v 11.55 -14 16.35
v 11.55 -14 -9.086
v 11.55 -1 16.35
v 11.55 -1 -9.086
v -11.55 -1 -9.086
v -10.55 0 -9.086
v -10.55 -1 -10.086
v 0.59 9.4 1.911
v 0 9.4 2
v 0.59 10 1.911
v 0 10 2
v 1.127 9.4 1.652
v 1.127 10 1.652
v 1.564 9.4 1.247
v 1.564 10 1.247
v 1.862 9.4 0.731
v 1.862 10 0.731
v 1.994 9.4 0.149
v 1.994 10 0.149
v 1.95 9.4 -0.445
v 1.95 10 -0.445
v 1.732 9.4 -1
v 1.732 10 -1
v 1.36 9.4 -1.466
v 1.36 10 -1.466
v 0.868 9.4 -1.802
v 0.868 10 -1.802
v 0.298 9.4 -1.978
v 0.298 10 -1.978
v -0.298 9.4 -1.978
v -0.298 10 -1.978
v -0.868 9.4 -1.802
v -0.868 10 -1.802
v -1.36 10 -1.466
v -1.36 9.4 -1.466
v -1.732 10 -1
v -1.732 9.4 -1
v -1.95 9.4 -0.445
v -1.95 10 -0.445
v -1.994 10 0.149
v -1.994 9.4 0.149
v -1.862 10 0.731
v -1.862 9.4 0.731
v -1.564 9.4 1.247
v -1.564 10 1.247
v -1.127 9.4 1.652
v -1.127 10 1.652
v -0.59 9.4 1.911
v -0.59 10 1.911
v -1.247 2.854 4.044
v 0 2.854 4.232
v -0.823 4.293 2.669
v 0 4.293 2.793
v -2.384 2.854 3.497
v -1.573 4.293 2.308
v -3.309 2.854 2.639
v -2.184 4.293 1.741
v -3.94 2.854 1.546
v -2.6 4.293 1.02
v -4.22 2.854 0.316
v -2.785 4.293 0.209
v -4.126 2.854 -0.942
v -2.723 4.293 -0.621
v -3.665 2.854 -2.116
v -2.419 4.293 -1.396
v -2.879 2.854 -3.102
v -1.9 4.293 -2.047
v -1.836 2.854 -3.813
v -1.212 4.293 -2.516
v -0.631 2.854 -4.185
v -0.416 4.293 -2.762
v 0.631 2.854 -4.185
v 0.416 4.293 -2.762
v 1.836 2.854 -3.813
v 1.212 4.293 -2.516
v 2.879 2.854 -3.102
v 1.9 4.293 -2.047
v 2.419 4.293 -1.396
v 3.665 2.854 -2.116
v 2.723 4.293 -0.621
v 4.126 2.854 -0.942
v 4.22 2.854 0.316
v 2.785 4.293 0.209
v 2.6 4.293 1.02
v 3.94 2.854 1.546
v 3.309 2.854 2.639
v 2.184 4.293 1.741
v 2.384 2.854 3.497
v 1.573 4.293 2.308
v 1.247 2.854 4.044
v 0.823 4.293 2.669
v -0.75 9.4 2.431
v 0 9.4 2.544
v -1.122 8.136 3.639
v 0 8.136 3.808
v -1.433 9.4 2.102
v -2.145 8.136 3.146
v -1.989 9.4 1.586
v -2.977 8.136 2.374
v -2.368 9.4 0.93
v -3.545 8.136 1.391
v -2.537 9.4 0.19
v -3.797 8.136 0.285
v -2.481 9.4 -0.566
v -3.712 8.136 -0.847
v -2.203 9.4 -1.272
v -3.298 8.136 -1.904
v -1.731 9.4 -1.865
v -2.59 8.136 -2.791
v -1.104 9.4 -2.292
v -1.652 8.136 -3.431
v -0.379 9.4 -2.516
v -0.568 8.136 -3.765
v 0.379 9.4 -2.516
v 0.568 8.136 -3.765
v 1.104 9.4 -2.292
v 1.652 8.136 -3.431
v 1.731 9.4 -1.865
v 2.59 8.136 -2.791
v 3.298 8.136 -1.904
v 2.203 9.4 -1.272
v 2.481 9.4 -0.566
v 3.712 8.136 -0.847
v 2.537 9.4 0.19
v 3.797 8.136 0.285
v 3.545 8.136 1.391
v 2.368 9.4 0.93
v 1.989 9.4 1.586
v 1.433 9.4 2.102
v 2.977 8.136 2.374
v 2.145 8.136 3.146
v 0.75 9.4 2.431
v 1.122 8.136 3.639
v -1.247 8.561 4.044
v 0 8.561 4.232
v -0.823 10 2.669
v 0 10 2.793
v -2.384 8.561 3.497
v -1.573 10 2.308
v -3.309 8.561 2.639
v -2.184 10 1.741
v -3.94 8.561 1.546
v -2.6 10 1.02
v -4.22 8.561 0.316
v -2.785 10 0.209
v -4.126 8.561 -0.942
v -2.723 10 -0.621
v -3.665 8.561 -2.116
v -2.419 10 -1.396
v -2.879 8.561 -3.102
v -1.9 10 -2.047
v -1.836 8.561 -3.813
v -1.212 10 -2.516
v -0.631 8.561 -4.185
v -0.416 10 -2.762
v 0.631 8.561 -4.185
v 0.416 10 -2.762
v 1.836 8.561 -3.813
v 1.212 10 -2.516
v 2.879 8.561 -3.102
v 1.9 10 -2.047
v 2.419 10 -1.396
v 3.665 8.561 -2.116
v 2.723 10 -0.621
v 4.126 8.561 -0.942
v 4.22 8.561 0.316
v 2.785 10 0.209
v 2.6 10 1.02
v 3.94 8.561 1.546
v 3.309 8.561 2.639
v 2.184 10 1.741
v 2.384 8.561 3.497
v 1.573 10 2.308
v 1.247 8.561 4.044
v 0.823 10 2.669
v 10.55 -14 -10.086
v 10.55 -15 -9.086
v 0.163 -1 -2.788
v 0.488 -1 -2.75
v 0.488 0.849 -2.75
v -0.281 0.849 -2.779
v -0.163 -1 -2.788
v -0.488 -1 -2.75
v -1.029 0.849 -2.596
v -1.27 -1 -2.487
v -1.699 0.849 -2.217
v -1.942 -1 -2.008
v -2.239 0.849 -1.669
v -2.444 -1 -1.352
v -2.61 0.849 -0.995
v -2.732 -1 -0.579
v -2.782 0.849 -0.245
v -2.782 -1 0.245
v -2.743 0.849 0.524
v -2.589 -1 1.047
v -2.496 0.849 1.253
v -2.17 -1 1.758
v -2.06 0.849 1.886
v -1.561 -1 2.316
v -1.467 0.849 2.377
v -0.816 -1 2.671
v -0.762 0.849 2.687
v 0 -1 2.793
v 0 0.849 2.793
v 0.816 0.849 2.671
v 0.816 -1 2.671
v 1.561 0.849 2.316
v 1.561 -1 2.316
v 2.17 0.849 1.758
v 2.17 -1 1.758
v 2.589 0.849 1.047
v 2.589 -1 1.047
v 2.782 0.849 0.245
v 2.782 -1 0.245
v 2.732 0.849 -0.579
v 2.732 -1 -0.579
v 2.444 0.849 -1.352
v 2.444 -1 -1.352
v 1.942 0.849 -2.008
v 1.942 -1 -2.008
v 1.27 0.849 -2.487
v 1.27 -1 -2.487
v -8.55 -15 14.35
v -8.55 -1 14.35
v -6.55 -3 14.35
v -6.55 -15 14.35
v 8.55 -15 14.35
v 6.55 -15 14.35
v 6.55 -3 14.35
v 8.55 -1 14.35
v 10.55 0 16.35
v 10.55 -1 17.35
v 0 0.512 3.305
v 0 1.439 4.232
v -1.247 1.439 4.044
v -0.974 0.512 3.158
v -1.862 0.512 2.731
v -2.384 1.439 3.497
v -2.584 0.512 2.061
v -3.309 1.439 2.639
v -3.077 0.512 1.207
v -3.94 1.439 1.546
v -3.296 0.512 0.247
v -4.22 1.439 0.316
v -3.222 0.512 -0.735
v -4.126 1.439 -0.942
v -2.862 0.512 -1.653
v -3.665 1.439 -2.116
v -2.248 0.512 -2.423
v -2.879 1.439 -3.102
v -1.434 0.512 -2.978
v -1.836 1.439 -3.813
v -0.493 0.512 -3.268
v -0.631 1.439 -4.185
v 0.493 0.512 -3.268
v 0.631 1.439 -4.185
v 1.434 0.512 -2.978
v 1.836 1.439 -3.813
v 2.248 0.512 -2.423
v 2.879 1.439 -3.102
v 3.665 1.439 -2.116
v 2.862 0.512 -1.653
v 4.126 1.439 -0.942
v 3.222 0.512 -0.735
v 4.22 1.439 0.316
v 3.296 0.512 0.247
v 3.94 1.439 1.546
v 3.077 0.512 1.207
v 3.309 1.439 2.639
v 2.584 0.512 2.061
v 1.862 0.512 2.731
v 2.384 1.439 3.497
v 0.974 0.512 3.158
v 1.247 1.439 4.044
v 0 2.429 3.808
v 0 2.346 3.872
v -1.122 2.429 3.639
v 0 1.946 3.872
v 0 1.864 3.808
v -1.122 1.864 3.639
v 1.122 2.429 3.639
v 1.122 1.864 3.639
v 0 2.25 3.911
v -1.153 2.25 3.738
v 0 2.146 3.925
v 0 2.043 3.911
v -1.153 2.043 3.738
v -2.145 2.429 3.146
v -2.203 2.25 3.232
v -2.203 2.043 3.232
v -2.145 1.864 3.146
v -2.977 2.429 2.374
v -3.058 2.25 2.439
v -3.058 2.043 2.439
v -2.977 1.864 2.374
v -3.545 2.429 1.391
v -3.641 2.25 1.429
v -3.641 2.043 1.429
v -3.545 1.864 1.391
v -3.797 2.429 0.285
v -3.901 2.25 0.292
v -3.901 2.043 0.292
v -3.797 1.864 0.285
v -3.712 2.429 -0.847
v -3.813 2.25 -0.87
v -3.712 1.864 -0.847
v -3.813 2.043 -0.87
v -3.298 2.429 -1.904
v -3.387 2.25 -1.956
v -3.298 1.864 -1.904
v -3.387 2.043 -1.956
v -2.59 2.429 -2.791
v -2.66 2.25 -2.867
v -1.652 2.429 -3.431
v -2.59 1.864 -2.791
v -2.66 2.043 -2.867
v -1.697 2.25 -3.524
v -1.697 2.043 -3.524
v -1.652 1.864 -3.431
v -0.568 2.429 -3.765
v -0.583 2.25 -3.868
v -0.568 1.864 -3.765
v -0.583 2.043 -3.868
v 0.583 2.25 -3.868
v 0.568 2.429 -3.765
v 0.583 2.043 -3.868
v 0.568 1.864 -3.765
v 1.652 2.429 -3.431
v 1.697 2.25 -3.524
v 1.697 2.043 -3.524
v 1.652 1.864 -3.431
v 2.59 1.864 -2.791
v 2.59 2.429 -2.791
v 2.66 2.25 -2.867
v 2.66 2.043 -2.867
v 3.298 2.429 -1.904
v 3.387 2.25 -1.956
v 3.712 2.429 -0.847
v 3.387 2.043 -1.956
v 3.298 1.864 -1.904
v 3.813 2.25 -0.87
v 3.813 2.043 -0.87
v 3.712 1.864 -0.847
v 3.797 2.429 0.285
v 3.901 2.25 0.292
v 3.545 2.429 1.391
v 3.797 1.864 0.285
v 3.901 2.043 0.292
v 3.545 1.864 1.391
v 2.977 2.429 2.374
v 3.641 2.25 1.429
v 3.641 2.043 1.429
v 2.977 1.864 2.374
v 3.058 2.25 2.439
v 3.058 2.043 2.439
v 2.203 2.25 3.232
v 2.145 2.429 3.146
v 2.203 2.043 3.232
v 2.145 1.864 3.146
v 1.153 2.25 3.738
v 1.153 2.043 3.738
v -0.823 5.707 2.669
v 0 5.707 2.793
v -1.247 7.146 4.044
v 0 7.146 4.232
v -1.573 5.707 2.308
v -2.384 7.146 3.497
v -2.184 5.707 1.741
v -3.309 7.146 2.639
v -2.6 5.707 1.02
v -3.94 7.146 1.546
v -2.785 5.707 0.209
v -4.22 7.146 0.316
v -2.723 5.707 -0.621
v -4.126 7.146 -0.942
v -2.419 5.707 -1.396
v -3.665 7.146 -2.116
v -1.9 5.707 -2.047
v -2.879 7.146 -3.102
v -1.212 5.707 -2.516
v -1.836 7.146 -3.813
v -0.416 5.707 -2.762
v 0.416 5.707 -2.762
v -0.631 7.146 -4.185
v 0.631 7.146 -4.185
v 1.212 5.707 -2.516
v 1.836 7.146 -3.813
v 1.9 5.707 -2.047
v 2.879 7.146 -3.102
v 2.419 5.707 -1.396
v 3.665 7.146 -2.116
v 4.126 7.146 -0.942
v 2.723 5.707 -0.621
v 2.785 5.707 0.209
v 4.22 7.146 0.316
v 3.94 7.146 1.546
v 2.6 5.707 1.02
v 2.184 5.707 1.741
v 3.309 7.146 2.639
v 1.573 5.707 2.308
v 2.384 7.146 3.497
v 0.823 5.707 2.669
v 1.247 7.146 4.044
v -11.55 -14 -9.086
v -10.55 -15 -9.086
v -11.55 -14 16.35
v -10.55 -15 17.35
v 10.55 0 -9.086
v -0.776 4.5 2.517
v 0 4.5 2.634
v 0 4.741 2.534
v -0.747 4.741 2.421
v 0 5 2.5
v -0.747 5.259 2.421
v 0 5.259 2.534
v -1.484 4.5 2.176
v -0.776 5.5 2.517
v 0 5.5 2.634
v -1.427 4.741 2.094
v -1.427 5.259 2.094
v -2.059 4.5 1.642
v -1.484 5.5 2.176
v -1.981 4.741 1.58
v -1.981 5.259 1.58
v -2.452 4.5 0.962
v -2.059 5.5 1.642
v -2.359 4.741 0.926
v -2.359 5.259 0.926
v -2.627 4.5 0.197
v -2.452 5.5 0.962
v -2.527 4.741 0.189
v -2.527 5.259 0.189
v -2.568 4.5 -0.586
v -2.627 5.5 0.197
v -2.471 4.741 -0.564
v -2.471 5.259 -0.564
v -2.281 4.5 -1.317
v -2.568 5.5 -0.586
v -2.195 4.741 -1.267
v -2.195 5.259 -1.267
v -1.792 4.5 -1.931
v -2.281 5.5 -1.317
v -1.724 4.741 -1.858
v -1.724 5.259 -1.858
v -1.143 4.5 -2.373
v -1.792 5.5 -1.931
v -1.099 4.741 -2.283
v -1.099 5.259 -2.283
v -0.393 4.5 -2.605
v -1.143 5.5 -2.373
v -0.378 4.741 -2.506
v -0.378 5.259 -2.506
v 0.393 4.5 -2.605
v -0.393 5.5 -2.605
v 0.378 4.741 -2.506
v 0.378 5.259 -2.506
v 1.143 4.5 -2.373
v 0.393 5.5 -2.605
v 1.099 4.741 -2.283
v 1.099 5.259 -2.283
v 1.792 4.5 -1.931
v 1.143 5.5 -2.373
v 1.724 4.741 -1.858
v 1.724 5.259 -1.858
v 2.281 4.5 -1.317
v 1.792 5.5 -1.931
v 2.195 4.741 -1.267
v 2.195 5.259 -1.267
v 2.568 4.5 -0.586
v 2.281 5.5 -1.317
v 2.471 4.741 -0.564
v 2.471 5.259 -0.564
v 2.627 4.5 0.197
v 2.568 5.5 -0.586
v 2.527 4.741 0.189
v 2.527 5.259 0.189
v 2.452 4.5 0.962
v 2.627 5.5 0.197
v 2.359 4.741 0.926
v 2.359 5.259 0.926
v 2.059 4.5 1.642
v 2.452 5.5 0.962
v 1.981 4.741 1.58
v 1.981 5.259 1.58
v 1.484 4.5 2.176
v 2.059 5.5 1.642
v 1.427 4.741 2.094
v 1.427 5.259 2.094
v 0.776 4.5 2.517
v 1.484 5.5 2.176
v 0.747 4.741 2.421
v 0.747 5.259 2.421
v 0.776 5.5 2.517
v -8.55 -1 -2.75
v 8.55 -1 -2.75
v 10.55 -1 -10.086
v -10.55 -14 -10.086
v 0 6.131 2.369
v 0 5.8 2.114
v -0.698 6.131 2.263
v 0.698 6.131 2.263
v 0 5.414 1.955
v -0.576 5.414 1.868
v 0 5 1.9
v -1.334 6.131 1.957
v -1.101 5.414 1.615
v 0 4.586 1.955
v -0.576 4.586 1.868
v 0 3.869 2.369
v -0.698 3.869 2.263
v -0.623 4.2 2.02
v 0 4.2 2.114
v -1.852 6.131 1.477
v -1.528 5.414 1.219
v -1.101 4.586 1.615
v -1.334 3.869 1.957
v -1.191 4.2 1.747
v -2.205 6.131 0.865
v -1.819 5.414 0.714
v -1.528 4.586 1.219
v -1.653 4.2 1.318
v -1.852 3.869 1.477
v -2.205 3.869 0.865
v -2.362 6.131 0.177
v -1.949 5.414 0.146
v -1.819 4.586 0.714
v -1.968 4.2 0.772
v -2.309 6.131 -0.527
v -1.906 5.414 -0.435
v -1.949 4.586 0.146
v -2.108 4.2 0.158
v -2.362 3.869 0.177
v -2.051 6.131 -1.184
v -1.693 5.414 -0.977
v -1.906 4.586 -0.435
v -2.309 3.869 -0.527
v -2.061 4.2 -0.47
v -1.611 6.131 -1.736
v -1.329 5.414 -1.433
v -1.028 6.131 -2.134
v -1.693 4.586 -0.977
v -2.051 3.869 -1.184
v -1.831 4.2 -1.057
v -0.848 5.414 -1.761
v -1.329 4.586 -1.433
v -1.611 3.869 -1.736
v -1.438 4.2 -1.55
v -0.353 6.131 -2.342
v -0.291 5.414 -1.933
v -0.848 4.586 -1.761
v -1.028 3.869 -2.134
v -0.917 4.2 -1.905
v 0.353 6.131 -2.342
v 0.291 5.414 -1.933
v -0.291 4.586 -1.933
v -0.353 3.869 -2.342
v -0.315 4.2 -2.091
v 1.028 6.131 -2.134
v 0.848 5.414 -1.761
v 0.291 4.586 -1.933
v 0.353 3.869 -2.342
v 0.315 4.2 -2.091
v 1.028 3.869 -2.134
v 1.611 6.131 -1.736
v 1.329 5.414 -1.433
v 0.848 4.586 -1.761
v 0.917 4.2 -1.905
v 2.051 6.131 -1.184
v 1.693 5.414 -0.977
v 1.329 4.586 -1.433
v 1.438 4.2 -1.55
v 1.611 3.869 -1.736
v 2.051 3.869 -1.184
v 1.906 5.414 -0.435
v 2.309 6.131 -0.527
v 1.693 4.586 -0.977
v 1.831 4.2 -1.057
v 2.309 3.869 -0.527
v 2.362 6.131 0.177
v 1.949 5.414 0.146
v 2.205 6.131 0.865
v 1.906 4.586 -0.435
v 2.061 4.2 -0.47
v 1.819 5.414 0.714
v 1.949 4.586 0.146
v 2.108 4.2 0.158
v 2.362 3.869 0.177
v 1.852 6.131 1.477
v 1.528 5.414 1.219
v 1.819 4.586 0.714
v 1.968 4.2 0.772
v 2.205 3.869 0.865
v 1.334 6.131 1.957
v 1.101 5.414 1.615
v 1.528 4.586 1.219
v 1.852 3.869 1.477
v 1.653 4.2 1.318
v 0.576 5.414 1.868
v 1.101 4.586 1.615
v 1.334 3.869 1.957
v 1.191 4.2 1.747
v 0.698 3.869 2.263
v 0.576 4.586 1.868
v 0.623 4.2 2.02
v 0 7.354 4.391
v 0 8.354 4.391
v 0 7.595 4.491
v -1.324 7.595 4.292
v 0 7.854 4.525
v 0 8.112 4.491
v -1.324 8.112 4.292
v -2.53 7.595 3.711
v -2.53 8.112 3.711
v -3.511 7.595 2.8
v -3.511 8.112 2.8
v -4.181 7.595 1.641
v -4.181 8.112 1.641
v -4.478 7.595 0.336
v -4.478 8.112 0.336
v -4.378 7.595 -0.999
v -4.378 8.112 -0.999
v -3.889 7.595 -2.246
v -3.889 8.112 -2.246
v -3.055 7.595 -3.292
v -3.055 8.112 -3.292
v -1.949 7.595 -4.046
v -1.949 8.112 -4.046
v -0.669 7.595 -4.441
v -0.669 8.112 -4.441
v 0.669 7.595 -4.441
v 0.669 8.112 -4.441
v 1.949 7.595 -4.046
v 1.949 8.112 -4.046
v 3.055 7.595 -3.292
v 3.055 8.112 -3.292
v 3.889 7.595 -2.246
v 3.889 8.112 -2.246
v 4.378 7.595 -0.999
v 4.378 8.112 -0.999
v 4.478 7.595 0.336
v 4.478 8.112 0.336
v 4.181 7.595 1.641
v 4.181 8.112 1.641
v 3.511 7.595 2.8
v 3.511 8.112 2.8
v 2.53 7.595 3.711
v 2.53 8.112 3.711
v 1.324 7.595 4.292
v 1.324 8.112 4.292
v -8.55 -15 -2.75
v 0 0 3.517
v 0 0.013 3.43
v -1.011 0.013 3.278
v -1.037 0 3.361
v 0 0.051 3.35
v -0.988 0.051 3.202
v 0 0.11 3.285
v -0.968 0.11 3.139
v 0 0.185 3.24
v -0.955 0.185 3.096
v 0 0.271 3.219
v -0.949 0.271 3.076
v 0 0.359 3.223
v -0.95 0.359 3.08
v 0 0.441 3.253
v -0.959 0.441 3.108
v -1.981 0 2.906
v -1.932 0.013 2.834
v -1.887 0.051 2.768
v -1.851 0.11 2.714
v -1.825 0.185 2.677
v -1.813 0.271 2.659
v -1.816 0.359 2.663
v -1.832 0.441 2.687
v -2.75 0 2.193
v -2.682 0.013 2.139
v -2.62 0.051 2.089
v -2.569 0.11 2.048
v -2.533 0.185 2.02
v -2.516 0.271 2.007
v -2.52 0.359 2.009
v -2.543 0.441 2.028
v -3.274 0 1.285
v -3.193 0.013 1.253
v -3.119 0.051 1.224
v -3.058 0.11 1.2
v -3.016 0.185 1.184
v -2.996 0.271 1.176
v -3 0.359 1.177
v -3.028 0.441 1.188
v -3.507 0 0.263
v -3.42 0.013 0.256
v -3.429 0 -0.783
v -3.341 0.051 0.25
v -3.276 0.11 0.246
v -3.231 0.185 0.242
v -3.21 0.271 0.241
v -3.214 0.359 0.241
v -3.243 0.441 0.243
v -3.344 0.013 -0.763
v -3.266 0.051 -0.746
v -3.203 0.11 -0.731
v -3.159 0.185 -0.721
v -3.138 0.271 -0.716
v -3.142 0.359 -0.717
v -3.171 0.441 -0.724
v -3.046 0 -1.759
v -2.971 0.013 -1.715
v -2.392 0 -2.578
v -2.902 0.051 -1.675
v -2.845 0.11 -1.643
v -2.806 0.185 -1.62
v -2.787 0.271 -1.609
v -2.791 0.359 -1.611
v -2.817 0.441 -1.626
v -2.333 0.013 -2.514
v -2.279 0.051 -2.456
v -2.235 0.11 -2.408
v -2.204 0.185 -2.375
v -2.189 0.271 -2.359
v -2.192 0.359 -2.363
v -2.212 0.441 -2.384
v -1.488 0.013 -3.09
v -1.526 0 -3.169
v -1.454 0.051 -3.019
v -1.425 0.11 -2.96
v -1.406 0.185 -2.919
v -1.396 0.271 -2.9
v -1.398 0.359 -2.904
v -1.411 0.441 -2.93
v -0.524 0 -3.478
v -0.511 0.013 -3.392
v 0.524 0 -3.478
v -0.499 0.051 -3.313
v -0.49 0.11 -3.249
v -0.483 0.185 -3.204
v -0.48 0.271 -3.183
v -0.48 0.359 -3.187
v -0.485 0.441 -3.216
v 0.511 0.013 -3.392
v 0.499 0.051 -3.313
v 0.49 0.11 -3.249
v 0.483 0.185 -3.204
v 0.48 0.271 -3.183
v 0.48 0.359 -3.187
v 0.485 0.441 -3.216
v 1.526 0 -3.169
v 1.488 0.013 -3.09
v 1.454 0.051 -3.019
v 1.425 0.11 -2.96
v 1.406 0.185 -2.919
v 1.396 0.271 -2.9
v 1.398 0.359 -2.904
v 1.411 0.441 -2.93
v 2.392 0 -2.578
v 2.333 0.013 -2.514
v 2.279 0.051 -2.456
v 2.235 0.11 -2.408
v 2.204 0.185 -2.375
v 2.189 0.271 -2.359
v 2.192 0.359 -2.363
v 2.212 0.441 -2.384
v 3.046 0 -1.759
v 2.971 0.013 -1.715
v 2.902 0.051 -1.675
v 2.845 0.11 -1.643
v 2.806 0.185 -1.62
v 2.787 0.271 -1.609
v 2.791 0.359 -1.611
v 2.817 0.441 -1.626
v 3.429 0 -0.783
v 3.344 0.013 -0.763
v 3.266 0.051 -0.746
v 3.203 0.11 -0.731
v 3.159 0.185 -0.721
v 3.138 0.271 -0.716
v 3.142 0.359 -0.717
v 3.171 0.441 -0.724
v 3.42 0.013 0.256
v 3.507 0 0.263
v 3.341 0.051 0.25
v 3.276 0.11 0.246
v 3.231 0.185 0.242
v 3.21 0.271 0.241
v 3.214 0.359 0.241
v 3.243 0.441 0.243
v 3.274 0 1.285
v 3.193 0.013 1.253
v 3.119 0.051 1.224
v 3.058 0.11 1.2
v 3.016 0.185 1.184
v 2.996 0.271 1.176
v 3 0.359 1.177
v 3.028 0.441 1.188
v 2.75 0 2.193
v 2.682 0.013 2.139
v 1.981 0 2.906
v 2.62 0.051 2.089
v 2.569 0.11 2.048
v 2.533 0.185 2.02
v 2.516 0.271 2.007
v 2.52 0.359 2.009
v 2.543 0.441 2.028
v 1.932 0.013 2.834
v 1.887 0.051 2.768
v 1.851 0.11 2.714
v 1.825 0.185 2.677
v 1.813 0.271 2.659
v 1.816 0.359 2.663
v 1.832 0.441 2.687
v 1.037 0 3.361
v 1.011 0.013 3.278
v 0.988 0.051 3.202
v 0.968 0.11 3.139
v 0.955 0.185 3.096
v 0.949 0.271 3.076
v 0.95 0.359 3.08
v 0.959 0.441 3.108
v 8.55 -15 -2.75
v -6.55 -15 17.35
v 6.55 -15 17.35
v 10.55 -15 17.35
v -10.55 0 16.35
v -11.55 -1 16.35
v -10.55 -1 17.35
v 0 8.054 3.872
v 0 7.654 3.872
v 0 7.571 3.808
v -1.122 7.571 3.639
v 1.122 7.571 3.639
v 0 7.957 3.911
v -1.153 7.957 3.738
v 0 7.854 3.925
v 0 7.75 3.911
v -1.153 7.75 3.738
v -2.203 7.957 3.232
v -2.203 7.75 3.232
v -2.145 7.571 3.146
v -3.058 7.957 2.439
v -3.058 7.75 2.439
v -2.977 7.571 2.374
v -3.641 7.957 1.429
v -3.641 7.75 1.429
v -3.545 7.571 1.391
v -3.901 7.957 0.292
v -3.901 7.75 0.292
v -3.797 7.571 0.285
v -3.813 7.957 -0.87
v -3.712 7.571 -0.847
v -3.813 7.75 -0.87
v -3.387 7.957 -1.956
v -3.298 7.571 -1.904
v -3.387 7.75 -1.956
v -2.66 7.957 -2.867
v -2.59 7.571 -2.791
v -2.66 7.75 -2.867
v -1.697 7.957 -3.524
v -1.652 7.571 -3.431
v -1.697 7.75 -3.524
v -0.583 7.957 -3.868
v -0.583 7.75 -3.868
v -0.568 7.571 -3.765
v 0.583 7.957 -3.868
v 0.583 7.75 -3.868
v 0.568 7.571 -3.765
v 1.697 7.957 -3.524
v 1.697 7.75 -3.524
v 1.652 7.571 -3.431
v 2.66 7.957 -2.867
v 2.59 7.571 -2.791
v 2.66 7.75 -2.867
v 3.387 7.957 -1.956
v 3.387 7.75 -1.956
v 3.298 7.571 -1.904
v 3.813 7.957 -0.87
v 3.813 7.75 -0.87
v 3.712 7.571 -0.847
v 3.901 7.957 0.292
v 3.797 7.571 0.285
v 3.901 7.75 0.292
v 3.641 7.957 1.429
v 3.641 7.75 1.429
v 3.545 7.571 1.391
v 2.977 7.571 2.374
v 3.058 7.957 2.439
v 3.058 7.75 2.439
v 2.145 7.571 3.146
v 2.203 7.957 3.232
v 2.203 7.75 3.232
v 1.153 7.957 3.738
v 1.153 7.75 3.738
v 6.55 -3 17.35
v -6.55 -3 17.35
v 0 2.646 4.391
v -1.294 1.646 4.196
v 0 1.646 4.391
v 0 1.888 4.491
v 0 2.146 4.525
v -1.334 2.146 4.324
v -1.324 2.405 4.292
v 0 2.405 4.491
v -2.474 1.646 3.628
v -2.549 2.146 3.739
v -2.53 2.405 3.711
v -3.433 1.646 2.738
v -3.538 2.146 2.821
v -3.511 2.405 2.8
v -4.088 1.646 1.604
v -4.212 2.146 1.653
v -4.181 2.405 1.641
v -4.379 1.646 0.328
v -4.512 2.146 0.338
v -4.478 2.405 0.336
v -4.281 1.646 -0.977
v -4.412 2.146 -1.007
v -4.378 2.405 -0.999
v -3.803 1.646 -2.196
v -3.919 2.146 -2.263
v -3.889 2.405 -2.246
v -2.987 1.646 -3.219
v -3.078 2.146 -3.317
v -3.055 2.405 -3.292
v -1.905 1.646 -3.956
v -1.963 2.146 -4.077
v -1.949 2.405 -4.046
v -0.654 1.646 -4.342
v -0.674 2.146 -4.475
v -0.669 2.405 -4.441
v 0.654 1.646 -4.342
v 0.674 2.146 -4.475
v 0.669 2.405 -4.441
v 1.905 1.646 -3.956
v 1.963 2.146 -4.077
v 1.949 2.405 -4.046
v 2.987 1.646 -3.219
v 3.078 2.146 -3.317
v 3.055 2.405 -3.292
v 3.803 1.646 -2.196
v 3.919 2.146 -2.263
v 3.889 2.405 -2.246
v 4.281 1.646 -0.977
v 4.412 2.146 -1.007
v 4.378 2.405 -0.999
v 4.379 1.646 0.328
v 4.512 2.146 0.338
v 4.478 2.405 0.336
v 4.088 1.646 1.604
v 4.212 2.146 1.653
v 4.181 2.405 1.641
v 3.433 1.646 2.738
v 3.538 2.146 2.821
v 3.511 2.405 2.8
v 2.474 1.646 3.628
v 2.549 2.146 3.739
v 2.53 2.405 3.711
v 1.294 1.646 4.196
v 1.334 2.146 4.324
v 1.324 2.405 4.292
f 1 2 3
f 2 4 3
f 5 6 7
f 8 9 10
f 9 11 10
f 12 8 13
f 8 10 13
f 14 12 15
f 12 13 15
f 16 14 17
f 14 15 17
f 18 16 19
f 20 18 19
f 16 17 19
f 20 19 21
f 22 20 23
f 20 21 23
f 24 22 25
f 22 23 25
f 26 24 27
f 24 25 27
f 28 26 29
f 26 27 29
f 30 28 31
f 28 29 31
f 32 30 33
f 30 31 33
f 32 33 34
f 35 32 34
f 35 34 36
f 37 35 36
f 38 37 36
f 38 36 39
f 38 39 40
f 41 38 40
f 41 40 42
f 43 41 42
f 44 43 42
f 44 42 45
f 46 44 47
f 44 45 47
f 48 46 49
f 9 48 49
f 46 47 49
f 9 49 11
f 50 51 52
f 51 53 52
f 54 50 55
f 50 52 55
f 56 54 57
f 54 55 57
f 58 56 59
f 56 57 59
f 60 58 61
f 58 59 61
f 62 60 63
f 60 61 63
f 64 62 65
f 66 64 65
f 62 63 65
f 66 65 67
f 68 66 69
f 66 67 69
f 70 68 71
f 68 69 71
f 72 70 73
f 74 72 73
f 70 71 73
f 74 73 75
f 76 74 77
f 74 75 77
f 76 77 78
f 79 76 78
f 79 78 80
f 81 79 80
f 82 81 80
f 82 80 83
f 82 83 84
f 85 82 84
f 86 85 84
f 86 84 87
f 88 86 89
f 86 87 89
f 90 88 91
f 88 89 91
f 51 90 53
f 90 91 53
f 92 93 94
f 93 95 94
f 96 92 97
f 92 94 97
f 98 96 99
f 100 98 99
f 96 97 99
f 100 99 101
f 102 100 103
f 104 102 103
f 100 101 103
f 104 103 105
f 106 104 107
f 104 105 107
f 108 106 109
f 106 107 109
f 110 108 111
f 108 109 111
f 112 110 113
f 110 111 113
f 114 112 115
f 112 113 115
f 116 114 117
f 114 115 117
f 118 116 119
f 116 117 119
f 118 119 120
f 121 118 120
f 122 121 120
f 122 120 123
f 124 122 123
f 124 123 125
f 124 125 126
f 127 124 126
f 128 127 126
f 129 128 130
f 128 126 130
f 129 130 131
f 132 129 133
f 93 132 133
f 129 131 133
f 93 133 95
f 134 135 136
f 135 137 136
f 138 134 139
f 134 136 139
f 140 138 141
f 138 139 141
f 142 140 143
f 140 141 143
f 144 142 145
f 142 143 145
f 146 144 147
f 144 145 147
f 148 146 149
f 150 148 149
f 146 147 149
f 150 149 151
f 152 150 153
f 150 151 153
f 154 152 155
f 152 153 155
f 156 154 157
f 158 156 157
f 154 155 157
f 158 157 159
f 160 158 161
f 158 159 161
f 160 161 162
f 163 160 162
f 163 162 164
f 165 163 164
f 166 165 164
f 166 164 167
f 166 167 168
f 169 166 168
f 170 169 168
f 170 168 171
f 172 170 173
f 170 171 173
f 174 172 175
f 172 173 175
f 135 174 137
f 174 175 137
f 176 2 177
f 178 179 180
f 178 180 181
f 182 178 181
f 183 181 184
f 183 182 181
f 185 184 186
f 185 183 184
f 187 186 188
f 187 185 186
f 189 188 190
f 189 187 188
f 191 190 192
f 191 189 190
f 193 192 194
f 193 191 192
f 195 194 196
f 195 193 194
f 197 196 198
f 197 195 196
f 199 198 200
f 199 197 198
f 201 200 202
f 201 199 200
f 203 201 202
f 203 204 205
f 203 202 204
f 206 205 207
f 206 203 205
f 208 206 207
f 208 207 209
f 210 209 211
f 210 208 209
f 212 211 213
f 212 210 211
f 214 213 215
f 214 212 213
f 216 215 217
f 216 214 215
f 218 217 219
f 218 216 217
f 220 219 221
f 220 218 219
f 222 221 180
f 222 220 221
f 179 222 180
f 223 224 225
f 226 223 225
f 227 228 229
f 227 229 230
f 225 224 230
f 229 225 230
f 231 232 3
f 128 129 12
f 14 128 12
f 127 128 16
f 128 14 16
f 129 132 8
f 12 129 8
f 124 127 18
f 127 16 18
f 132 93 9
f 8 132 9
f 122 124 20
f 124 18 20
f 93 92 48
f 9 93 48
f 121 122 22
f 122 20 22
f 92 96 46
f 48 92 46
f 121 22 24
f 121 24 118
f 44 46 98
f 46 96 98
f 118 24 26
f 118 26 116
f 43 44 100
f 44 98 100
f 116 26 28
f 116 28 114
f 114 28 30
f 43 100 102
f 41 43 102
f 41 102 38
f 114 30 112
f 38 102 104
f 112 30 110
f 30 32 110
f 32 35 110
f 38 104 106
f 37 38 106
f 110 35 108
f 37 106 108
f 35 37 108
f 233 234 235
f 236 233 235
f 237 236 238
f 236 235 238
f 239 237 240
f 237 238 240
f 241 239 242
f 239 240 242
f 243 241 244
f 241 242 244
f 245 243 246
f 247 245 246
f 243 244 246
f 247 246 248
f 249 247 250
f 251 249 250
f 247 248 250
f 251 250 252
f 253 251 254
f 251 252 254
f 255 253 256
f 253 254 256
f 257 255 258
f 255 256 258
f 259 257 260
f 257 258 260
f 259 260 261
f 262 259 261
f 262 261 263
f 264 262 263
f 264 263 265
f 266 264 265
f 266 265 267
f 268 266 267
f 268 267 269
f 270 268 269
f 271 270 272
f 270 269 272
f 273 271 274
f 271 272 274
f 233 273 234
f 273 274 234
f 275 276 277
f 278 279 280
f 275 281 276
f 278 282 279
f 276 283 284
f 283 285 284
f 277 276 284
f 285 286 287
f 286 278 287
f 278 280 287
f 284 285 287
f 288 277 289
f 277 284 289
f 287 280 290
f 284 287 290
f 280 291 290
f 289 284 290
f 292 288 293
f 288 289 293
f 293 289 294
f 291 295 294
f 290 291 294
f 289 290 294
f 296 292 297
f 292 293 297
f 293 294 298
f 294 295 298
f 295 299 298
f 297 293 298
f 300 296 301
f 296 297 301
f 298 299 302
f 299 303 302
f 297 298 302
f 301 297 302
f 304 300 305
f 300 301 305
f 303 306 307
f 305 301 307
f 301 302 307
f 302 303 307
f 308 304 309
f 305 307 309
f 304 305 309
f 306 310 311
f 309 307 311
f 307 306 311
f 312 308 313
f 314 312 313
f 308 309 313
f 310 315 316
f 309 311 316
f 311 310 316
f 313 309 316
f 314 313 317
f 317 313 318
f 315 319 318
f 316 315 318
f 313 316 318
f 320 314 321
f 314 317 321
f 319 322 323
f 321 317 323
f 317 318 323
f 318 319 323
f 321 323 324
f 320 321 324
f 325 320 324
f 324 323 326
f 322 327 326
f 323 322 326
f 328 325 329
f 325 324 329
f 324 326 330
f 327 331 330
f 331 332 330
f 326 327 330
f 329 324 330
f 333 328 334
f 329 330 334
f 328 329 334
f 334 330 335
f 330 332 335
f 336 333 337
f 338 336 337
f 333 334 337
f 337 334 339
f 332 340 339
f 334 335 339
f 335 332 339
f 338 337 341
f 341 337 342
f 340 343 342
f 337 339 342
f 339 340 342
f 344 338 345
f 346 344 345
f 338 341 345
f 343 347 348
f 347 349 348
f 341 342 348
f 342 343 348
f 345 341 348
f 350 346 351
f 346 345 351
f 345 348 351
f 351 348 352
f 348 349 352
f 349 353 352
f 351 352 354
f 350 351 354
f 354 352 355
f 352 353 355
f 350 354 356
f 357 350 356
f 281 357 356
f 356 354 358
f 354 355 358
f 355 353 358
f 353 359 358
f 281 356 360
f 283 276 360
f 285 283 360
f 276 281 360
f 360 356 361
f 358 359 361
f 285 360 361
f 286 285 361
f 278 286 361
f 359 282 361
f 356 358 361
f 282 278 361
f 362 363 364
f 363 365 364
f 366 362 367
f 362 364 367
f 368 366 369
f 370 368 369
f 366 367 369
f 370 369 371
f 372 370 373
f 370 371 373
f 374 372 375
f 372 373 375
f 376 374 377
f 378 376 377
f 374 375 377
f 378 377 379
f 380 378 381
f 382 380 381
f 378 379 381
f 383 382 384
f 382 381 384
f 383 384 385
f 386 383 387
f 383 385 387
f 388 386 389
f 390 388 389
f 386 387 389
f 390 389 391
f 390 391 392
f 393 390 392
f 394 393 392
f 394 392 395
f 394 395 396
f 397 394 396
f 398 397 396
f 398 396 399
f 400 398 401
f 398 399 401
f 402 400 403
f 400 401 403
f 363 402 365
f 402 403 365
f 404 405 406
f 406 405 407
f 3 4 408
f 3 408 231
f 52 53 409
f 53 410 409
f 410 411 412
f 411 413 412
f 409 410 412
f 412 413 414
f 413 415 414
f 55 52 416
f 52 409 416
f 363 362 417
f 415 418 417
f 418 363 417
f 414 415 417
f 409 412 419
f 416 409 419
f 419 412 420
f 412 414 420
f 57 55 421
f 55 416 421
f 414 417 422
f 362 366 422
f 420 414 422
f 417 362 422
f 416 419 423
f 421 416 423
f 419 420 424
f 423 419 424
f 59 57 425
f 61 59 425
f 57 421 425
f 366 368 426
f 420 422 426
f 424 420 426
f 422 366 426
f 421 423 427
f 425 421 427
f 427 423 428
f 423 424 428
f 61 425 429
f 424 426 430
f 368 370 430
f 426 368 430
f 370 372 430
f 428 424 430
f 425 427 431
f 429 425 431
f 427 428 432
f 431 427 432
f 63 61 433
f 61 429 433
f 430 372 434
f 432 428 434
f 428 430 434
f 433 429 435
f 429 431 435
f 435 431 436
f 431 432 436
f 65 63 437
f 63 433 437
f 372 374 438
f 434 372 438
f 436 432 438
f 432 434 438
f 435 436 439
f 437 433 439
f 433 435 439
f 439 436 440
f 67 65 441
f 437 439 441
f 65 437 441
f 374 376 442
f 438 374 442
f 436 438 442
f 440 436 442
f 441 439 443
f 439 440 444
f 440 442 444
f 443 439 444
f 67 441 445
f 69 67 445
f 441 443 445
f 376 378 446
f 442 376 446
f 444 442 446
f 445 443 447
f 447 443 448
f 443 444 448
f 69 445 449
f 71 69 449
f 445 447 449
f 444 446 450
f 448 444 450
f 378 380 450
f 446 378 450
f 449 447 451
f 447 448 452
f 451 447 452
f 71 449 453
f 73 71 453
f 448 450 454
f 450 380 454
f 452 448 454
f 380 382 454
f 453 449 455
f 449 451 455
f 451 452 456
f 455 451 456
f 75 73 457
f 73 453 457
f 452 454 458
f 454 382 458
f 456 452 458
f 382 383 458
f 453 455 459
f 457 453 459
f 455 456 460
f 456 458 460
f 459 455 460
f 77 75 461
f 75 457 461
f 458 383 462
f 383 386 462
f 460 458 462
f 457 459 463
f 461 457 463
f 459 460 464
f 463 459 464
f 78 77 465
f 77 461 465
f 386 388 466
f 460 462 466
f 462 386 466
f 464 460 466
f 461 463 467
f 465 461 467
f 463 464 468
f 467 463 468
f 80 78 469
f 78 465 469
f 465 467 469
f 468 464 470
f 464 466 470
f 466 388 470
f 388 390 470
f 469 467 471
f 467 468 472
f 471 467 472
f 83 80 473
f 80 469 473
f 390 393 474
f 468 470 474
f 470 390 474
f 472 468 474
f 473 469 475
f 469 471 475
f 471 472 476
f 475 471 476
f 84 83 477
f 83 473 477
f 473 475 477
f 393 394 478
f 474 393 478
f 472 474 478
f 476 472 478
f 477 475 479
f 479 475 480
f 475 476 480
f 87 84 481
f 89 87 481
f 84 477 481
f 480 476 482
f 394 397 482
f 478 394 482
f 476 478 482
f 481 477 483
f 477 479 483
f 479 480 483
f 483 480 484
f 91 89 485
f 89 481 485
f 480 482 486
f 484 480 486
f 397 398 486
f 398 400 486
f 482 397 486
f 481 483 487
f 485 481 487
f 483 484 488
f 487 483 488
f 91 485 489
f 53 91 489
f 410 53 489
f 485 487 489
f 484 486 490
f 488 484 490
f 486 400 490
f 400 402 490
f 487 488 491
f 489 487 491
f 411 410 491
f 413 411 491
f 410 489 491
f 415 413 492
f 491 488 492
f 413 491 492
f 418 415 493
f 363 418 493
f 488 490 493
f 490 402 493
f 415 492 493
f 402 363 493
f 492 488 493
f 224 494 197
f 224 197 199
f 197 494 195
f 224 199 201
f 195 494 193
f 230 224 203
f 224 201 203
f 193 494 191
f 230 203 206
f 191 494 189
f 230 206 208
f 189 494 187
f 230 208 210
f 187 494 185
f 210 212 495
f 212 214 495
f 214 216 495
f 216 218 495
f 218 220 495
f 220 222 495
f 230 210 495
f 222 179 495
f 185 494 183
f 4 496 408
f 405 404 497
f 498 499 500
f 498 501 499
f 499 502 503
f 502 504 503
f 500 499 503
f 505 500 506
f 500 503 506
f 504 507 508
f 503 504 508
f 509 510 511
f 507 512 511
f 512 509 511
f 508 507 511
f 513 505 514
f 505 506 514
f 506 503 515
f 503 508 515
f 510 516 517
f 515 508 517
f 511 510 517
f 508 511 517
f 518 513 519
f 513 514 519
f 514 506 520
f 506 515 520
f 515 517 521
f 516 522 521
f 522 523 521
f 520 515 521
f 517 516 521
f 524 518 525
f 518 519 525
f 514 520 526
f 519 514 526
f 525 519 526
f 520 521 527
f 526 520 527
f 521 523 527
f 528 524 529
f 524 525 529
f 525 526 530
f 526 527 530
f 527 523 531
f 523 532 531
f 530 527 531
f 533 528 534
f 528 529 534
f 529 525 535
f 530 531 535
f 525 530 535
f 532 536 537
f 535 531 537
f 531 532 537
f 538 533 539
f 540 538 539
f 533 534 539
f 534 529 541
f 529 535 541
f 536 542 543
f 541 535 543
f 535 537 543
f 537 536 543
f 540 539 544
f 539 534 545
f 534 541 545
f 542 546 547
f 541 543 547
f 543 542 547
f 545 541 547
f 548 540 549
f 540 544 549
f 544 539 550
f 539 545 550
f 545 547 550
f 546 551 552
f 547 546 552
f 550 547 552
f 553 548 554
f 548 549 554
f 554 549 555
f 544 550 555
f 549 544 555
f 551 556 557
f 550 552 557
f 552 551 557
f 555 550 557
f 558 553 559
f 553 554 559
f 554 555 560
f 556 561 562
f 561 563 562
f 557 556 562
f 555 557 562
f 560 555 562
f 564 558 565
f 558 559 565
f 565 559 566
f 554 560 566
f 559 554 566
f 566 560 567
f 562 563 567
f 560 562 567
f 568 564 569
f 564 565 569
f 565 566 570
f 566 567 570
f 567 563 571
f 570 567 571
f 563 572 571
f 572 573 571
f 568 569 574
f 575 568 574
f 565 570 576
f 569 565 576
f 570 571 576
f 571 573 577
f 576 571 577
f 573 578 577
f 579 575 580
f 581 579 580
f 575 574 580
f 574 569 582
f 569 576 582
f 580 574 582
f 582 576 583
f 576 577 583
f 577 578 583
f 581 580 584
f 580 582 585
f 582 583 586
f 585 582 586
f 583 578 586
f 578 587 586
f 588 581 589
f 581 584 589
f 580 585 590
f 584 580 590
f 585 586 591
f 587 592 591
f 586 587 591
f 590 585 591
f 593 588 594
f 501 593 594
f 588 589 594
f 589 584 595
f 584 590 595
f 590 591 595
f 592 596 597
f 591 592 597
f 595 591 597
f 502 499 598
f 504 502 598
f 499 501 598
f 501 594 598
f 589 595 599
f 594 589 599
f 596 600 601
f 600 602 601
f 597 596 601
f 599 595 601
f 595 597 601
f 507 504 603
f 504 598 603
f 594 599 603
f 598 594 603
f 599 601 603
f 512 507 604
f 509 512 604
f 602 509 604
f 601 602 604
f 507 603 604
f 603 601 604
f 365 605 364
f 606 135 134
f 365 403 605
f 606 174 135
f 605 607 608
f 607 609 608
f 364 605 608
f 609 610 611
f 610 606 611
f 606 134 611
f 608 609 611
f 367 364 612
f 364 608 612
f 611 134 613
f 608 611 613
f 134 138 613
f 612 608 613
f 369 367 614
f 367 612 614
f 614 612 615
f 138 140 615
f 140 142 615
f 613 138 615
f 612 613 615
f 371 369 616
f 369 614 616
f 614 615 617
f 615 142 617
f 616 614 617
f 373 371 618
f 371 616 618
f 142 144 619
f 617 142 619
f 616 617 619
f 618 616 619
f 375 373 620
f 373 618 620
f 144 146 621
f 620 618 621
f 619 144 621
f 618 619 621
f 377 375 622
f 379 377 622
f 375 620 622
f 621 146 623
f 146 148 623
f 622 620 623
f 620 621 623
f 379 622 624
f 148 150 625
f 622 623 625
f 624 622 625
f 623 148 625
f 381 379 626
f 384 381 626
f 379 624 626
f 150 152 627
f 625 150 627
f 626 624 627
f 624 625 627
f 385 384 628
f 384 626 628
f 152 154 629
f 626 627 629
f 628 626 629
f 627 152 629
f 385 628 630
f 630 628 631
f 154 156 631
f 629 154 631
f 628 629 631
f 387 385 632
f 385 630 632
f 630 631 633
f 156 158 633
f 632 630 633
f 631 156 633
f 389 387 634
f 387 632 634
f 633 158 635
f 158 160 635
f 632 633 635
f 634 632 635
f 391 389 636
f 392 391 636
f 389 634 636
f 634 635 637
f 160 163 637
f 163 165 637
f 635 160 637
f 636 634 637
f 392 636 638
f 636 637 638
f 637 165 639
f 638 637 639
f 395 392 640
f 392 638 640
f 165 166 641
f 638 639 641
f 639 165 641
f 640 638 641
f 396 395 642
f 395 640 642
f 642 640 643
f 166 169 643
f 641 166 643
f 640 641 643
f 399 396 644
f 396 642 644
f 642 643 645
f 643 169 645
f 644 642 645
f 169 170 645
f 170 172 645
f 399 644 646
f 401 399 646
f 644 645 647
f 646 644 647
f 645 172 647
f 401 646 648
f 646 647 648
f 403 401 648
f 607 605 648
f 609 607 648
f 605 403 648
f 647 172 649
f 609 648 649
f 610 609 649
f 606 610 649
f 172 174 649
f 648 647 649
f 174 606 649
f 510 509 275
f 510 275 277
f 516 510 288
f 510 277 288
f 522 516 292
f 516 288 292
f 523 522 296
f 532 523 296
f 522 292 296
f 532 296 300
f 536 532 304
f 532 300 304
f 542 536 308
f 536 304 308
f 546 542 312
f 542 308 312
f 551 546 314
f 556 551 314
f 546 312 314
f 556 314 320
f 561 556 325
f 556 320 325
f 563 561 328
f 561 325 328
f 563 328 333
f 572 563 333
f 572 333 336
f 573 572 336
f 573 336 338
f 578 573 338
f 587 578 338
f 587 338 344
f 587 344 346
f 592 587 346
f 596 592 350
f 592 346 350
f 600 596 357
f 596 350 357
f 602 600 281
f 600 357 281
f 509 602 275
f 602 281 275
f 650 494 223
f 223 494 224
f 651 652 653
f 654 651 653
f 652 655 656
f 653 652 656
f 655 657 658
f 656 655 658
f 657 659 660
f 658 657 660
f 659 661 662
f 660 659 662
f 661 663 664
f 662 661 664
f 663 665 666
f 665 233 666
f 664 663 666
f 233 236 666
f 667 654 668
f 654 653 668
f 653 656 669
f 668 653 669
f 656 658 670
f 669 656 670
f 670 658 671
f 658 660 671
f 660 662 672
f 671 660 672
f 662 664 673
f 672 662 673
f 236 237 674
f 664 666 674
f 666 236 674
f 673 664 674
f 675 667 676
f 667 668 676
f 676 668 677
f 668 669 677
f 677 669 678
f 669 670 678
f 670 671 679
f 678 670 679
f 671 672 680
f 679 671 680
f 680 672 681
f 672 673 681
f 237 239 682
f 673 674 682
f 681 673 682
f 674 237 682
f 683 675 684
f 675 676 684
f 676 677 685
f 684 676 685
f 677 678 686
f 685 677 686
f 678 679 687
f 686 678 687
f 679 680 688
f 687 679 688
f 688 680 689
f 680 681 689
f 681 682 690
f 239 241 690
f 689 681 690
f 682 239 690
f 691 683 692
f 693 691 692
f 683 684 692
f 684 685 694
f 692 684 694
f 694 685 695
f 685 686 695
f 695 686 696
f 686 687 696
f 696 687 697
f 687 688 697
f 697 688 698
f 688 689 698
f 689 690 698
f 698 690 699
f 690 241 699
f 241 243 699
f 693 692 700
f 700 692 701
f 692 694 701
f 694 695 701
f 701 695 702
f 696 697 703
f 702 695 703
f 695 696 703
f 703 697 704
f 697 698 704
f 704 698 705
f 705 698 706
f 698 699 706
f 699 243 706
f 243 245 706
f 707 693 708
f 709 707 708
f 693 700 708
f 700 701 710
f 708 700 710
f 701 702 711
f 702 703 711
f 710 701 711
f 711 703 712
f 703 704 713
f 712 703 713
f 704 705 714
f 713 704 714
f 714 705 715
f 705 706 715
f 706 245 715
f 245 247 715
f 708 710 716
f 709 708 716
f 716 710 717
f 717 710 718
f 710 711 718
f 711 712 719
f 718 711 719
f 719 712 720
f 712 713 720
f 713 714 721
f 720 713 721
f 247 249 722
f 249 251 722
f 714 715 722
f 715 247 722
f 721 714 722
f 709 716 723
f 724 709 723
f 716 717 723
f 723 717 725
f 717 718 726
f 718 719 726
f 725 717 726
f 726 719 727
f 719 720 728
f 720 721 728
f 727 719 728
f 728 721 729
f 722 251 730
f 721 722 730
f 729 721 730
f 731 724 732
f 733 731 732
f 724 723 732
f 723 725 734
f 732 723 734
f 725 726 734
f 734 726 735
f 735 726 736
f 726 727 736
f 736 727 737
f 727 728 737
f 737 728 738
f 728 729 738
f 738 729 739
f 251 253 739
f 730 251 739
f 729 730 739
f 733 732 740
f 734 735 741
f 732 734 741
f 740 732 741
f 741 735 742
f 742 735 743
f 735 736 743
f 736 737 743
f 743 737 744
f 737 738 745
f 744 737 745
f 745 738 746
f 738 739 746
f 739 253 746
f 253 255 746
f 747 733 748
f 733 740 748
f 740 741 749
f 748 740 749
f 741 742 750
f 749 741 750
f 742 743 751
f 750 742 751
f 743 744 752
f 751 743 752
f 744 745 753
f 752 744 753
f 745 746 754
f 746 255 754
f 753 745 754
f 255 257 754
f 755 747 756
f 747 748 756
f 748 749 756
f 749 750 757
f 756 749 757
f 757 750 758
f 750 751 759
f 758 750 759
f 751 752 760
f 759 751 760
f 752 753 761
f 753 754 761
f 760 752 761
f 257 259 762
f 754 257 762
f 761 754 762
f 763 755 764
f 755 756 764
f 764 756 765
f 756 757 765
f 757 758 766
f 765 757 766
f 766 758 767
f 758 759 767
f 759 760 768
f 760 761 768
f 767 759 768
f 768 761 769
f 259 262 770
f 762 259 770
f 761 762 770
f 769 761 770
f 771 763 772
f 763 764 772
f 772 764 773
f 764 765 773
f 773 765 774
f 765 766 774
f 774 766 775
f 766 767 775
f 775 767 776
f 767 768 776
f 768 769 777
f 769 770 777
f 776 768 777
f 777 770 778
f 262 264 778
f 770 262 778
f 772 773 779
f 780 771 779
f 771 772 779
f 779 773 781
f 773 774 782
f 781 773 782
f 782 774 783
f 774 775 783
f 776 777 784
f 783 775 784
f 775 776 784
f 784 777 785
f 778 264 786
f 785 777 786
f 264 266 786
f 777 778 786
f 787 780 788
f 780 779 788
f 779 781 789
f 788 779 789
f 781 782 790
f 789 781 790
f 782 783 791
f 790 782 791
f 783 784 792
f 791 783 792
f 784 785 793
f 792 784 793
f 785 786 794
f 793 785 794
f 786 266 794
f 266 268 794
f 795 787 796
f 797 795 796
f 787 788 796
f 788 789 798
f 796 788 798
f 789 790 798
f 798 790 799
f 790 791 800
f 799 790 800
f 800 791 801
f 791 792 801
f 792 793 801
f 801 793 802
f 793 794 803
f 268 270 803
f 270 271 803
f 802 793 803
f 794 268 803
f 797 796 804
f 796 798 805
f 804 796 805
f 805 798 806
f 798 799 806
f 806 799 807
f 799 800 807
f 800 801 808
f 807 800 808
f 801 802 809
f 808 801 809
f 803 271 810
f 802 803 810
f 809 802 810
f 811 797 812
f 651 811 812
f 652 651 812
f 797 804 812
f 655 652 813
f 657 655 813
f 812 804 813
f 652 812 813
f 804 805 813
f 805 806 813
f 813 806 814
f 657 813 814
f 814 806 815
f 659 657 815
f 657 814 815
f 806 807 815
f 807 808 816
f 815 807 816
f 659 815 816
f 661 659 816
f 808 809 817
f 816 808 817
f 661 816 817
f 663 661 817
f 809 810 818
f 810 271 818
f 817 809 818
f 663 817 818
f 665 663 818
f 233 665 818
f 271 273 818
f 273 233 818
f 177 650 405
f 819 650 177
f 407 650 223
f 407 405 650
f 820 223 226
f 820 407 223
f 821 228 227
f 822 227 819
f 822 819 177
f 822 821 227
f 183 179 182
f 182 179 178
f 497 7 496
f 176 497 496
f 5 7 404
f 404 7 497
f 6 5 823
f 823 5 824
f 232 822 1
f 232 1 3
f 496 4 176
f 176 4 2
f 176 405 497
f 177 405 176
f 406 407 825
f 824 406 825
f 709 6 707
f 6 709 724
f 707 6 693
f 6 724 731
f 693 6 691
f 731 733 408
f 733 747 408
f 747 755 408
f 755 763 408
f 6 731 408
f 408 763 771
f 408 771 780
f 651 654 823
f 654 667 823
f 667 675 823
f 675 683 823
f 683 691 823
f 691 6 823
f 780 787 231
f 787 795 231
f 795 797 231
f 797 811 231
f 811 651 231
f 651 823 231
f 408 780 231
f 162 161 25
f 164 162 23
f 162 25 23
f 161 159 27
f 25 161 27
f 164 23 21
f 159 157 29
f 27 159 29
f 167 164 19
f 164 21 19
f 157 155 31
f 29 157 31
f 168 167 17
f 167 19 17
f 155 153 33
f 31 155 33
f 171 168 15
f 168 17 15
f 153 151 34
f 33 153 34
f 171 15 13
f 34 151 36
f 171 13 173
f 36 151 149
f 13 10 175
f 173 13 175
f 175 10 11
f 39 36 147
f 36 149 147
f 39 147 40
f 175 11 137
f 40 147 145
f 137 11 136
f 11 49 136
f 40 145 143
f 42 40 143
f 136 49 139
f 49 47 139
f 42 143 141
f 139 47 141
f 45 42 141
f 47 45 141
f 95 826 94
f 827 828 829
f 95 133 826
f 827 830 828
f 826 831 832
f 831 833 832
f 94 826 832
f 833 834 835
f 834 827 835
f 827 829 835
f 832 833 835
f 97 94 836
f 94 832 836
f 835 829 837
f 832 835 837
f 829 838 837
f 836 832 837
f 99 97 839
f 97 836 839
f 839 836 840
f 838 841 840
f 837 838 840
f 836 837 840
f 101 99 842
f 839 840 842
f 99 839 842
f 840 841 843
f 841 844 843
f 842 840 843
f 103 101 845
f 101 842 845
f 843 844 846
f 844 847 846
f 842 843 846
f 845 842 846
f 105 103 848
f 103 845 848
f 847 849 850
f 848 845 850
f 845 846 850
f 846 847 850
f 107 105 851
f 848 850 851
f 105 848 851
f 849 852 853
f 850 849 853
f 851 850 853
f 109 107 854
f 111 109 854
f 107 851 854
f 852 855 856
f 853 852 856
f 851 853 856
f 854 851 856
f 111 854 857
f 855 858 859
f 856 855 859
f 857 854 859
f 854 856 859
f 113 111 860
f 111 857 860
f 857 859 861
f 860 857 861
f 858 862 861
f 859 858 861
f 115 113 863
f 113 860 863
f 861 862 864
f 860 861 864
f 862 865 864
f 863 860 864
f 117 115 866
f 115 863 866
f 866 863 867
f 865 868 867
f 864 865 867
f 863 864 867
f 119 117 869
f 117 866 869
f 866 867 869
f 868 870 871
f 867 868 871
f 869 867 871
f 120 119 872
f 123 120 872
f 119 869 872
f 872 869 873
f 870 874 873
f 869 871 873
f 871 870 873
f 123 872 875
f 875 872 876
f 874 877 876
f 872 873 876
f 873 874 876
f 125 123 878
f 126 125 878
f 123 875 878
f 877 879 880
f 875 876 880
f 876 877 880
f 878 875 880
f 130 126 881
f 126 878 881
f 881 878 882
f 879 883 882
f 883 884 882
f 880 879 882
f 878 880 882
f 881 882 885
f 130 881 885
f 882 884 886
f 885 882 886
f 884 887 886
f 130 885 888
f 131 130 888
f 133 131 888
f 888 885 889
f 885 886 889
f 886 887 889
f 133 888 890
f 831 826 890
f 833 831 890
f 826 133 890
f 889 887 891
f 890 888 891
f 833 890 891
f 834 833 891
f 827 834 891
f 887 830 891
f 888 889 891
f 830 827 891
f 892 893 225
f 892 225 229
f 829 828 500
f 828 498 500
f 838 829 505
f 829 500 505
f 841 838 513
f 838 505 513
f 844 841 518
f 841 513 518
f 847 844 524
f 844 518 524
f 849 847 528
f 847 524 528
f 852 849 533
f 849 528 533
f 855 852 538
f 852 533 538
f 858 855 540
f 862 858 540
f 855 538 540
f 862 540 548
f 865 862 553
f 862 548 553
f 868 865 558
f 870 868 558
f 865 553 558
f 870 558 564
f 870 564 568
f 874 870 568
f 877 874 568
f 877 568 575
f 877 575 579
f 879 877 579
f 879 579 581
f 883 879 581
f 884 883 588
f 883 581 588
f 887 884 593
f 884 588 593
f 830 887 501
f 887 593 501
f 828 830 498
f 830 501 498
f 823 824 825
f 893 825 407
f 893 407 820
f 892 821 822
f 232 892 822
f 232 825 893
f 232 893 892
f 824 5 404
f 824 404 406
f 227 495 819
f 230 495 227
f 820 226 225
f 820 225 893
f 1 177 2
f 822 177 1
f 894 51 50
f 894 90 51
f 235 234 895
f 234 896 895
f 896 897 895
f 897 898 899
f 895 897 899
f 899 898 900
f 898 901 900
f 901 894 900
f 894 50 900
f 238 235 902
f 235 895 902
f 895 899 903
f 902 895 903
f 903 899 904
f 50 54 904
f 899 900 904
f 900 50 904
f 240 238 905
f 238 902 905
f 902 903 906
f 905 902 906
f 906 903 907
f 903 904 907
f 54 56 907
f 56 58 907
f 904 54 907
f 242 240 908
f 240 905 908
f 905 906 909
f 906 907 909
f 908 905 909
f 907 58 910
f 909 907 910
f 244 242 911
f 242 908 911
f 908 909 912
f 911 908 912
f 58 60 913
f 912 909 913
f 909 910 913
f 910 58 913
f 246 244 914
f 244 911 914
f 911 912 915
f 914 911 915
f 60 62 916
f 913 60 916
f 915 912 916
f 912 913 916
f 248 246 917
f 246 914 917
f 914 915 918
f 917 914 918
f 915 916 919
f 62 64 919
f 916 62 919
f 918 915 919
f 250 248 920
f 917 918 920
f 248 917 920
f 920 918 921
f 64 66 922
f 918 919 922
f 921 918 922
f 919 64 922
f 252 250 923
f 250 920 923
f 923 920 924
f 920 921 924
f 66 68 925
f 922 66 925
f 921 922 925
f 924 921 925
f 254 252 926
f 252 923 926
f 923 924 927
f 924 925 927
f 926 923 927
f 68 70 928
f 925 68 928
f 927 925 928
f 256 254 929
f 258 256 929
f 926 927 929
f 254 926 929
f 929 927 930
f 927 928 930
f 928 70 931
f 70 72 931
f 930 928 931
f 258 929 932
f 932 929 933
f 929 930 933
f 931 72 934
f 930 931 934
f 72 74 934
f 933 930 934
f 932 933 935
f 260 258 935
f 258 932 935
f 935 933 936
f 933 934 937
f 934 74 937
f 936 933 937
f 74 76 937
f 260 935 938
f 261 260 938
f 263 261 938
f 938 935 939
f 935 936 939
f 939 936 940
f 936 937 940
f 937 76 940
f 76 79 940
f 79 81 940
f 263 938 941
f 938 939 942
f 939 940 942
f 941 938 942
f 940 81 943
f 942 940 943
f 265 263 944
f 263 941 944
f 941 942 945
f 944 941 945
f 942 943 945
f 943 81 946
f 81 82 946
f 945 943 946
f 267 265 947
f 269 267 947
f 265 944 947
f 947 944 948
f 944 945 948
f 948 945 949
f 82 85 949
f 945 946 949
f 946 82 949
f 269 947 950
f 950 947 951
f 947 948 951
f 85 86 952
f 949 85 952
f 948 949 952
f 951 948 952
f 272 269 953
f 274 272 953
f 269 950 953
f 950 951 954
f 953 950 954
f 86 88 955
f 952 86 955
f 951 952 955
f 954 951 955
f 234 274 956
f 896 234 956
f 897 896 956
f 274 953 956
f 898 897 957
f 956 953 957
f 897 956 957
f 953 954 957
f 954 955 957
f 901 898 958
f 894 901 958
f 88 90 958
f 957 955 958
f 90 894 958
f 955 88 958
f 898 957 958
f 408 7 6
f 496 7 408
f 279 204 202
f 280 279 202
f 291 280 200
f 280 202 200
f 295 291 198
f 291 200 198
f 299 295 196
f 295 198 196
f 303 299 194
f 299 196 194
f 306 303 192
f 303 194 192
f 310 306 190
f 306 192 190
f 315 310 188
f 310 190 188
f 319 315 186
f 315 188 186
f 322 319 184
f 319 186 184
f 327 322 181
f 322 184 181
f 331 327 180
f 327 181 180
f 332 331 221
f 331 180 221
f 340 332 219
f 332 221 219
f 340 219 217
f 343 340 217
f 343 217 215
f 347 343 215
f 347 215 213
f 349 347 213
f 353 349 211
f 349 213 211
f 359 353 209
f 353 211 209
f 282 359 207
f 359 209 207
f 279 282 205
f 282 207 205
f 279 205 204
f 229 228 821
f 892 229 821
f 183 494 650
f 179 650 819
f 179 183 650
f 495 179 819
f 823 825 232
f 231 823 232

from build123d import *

# Parameters (mm, degrees)
CUT_EXTRUDE1_REACH  = 13.872
SKETCH2_R           = 2
SKETCH3_W           = 23.1
SKETCH3_H           = 27.435786438
SKETCH3_W_2         = 17.1
SKETCH3_H_2         = 17.1
BOSS_EXTRUDE1_DEPTH = 15
SKETCH4_W           = 23.1
SKETCH4_H           = 27.435786438
BOSS_EXTRUDE3_DEPTH = 1
FILLET2_R           = 0.3
CUT_EXTRUDE2_REACH  = 27.108
SKETCH5_R           = 2.792893219
SKETCH6_W           = 13.1
SKETCH6_H           = 3
CUT_EXTRUDE3_DEPTH  = 12
CHAMFER1_SIZE       = 1


with BuildPart() as part:
    # Sketch1 → Revolve1 (revolve)
    with BuildSketch(Plane.XY, mode=Mode.PRIVATE) as revolve1_sk:
        with BuildLine():
            Line((0, 0.6), (0, 0))
            Line((0, 0), (2.792893219, 0))
            Line((2.792893219, 0), (4.232233047, 1.439339828))
            ThreePointArc((4.232233047, 1.439339828), (4.525126266, 2.146446609), (4.232233047, 2.853553391))
            Line((4.232233047, 2.853553391), (2.792893219, 4.292893219))
            ThreePointArc((2.792893219, 4.292893219), (2.5, 5), (2.792893219, 5.707106781))
            Line((2.792893219, 5.707106781), (4.232233047, 7.146446609))
            ThreePointArc((4.232233047, 7.146446609), (4.525126266, 7.853553391), (4.232233047, 8.560660172))
            Line((4.232233047, 8.560660172), (2.792893219, 10))
            Line((2.792893219, 10), (0, 10))
            Line((0, 10), (0, 9.4))
            Line((0, 9.4), (2.544365081, 9.4))
            Line((2.544365081, 9.4), (3.807968978, 8.136396103))
            ThreePointArc((3.807968978, 8.136396103), (3.925126266, 7.853553391), (3.807968978, 7.570710678))
            Line((3.807968978, 7.570710678), (2.36862915, 6.13137085))
            ThreePointArc((2.36862915, 6.13137085), (1.9, 5), (2.36862915, 3.86862915))
            Line((2.36862915, 3.86862915), (3.807968978, 2.429289322))
            ThreePointArc((3.807968978, 2.429289322), (3.925126266, 2.146446609), (3.807968978, 1.863603897))
            Line((3.807968978, 1.863603897), (2.544365081, 0.6))
            Line((2.544365081, 0.6), (0, 0.6))
        make_face()
    revolve(revolve1_sk.sketch.rotate(Axis((0, 10, 0), (0, -1, 0)), 90), axis=Axis((0, 10, 0), (0, -1, 0)))

    # Sketch2 → Cut-Extrude1 (cut, up to next)
    with BuildSketch(Plane(origin=(0, 10, 0), x_dir=(1, 0, 0), z_dir=(0, 1, 0)), mode=Mode.PRIVATE) as cut_extrude1_sk1:
        with Locations(Location((0, 0, 0), (0, 0, 270))):
            Circle(SKETCH2_R)
    cut_extrude1_tool1 = extrude(cut_extrude1_sk1.sketch, amount=-CUT_EXTRUDE1_REACH, mode=Mode.PRIVATE) & part.part
    add(cut_extrude1_tool1.solids().sort_by_distance((0, 10, 0))[0], mode=Mode.SUBTRACT)

    # Sketch3 → Boss-Extrude1 (add)
    with BuildSketch(Plane.XZ):
        with Locations((0, 3.632106781)):
            Rectangle(SKETCH3_W, SKETCH3_H)
        with Locations((0, 5.8)):
            Rectangle(SKETCH3_W_2, SKETCH3_H_2, mode=Mode.SUBTRACT)
    extrude(amount=BOSS_EXTRUDE1_DEPTH)

    # Sketch4 → Boss-Extrude3 (add)
    with BuildSketch(Plane(origin=(0, 0, 0), x_dir=(1, 0, 0), z_dir=(0, 1, 0))):
        with Locations((0, -3.632106781)):
            Rectangle(SKETCH4_W, SKETCH4_H)
    extrude(amount=-BOSS_EXTRUDE3_DEPTH)

    # Fillet2
    fillet2_edges = [part.edges().sort_by_distance(p)[0] for p in [
        (0, 0, -2.792893219),
    ]]
    fillet(fillet2_edges, radius=FILLET2_R)

    # Sketch5 → Cut-Extrude2 (cut, up to next)
    with BuildSketch(Plane(origin=(0, -1, 0), x_dir=(1, 0, 0), z_dir=(0, 1, 0)), mode=Mode.PRIVATE) as cut_extrude2_sk1:
        with Locations(Location((0, 0, 0), (0, 0, 79.945460625))):
            Circle(SKETCH5_R)
    cut_extrude2_tool1 = extrude(cut_extrude2_sk1.sketch, amount=CUT_EXTRUDE2_REACH, mode=Mode.PRIVATE) & part.part
    add(cut_extrude2_tool1.solids().sort_by_distance((0, -1, 0))[0], mode=Mode.SUBTRACT)

    # Sketch6 → Cut-Extrude3 (cut)
    with BuildSketch(Plane.XZ.offset(15)):
        with Locations((0, 15.85)):
            Rectangle(SKETCH6_W, SKETCH6_H)
    extrude(amount=-CUT_EXTRUDE3_DEPTH, mode=Mode.SUBTRACT)

    # Chamfer1
    chamfer1_edges = [part.edges().sort_by_distance(p)[0] for p in [
        (-11.55, 0, 3.632106781),
        (-11.55, -7.5, 17.35),
        (0, 0, -10.085786438),
        (-11.55, -7.5, -10.085786438),
        (11.55, -15, 3.632106781),
        (11.55, -7.5, -10.085786438),
        (11.55, -7.5, 17.35),
        (-11.55, -15, 3.632106781),
        (0, -15, -10.085786438),
        (0, 0, 17.35),
        (11.55, 0, 3.632106781),
    ]]
    chamfer(chamfer1_edges, length=CHAMFER1_SIZE)


solid = part.part
